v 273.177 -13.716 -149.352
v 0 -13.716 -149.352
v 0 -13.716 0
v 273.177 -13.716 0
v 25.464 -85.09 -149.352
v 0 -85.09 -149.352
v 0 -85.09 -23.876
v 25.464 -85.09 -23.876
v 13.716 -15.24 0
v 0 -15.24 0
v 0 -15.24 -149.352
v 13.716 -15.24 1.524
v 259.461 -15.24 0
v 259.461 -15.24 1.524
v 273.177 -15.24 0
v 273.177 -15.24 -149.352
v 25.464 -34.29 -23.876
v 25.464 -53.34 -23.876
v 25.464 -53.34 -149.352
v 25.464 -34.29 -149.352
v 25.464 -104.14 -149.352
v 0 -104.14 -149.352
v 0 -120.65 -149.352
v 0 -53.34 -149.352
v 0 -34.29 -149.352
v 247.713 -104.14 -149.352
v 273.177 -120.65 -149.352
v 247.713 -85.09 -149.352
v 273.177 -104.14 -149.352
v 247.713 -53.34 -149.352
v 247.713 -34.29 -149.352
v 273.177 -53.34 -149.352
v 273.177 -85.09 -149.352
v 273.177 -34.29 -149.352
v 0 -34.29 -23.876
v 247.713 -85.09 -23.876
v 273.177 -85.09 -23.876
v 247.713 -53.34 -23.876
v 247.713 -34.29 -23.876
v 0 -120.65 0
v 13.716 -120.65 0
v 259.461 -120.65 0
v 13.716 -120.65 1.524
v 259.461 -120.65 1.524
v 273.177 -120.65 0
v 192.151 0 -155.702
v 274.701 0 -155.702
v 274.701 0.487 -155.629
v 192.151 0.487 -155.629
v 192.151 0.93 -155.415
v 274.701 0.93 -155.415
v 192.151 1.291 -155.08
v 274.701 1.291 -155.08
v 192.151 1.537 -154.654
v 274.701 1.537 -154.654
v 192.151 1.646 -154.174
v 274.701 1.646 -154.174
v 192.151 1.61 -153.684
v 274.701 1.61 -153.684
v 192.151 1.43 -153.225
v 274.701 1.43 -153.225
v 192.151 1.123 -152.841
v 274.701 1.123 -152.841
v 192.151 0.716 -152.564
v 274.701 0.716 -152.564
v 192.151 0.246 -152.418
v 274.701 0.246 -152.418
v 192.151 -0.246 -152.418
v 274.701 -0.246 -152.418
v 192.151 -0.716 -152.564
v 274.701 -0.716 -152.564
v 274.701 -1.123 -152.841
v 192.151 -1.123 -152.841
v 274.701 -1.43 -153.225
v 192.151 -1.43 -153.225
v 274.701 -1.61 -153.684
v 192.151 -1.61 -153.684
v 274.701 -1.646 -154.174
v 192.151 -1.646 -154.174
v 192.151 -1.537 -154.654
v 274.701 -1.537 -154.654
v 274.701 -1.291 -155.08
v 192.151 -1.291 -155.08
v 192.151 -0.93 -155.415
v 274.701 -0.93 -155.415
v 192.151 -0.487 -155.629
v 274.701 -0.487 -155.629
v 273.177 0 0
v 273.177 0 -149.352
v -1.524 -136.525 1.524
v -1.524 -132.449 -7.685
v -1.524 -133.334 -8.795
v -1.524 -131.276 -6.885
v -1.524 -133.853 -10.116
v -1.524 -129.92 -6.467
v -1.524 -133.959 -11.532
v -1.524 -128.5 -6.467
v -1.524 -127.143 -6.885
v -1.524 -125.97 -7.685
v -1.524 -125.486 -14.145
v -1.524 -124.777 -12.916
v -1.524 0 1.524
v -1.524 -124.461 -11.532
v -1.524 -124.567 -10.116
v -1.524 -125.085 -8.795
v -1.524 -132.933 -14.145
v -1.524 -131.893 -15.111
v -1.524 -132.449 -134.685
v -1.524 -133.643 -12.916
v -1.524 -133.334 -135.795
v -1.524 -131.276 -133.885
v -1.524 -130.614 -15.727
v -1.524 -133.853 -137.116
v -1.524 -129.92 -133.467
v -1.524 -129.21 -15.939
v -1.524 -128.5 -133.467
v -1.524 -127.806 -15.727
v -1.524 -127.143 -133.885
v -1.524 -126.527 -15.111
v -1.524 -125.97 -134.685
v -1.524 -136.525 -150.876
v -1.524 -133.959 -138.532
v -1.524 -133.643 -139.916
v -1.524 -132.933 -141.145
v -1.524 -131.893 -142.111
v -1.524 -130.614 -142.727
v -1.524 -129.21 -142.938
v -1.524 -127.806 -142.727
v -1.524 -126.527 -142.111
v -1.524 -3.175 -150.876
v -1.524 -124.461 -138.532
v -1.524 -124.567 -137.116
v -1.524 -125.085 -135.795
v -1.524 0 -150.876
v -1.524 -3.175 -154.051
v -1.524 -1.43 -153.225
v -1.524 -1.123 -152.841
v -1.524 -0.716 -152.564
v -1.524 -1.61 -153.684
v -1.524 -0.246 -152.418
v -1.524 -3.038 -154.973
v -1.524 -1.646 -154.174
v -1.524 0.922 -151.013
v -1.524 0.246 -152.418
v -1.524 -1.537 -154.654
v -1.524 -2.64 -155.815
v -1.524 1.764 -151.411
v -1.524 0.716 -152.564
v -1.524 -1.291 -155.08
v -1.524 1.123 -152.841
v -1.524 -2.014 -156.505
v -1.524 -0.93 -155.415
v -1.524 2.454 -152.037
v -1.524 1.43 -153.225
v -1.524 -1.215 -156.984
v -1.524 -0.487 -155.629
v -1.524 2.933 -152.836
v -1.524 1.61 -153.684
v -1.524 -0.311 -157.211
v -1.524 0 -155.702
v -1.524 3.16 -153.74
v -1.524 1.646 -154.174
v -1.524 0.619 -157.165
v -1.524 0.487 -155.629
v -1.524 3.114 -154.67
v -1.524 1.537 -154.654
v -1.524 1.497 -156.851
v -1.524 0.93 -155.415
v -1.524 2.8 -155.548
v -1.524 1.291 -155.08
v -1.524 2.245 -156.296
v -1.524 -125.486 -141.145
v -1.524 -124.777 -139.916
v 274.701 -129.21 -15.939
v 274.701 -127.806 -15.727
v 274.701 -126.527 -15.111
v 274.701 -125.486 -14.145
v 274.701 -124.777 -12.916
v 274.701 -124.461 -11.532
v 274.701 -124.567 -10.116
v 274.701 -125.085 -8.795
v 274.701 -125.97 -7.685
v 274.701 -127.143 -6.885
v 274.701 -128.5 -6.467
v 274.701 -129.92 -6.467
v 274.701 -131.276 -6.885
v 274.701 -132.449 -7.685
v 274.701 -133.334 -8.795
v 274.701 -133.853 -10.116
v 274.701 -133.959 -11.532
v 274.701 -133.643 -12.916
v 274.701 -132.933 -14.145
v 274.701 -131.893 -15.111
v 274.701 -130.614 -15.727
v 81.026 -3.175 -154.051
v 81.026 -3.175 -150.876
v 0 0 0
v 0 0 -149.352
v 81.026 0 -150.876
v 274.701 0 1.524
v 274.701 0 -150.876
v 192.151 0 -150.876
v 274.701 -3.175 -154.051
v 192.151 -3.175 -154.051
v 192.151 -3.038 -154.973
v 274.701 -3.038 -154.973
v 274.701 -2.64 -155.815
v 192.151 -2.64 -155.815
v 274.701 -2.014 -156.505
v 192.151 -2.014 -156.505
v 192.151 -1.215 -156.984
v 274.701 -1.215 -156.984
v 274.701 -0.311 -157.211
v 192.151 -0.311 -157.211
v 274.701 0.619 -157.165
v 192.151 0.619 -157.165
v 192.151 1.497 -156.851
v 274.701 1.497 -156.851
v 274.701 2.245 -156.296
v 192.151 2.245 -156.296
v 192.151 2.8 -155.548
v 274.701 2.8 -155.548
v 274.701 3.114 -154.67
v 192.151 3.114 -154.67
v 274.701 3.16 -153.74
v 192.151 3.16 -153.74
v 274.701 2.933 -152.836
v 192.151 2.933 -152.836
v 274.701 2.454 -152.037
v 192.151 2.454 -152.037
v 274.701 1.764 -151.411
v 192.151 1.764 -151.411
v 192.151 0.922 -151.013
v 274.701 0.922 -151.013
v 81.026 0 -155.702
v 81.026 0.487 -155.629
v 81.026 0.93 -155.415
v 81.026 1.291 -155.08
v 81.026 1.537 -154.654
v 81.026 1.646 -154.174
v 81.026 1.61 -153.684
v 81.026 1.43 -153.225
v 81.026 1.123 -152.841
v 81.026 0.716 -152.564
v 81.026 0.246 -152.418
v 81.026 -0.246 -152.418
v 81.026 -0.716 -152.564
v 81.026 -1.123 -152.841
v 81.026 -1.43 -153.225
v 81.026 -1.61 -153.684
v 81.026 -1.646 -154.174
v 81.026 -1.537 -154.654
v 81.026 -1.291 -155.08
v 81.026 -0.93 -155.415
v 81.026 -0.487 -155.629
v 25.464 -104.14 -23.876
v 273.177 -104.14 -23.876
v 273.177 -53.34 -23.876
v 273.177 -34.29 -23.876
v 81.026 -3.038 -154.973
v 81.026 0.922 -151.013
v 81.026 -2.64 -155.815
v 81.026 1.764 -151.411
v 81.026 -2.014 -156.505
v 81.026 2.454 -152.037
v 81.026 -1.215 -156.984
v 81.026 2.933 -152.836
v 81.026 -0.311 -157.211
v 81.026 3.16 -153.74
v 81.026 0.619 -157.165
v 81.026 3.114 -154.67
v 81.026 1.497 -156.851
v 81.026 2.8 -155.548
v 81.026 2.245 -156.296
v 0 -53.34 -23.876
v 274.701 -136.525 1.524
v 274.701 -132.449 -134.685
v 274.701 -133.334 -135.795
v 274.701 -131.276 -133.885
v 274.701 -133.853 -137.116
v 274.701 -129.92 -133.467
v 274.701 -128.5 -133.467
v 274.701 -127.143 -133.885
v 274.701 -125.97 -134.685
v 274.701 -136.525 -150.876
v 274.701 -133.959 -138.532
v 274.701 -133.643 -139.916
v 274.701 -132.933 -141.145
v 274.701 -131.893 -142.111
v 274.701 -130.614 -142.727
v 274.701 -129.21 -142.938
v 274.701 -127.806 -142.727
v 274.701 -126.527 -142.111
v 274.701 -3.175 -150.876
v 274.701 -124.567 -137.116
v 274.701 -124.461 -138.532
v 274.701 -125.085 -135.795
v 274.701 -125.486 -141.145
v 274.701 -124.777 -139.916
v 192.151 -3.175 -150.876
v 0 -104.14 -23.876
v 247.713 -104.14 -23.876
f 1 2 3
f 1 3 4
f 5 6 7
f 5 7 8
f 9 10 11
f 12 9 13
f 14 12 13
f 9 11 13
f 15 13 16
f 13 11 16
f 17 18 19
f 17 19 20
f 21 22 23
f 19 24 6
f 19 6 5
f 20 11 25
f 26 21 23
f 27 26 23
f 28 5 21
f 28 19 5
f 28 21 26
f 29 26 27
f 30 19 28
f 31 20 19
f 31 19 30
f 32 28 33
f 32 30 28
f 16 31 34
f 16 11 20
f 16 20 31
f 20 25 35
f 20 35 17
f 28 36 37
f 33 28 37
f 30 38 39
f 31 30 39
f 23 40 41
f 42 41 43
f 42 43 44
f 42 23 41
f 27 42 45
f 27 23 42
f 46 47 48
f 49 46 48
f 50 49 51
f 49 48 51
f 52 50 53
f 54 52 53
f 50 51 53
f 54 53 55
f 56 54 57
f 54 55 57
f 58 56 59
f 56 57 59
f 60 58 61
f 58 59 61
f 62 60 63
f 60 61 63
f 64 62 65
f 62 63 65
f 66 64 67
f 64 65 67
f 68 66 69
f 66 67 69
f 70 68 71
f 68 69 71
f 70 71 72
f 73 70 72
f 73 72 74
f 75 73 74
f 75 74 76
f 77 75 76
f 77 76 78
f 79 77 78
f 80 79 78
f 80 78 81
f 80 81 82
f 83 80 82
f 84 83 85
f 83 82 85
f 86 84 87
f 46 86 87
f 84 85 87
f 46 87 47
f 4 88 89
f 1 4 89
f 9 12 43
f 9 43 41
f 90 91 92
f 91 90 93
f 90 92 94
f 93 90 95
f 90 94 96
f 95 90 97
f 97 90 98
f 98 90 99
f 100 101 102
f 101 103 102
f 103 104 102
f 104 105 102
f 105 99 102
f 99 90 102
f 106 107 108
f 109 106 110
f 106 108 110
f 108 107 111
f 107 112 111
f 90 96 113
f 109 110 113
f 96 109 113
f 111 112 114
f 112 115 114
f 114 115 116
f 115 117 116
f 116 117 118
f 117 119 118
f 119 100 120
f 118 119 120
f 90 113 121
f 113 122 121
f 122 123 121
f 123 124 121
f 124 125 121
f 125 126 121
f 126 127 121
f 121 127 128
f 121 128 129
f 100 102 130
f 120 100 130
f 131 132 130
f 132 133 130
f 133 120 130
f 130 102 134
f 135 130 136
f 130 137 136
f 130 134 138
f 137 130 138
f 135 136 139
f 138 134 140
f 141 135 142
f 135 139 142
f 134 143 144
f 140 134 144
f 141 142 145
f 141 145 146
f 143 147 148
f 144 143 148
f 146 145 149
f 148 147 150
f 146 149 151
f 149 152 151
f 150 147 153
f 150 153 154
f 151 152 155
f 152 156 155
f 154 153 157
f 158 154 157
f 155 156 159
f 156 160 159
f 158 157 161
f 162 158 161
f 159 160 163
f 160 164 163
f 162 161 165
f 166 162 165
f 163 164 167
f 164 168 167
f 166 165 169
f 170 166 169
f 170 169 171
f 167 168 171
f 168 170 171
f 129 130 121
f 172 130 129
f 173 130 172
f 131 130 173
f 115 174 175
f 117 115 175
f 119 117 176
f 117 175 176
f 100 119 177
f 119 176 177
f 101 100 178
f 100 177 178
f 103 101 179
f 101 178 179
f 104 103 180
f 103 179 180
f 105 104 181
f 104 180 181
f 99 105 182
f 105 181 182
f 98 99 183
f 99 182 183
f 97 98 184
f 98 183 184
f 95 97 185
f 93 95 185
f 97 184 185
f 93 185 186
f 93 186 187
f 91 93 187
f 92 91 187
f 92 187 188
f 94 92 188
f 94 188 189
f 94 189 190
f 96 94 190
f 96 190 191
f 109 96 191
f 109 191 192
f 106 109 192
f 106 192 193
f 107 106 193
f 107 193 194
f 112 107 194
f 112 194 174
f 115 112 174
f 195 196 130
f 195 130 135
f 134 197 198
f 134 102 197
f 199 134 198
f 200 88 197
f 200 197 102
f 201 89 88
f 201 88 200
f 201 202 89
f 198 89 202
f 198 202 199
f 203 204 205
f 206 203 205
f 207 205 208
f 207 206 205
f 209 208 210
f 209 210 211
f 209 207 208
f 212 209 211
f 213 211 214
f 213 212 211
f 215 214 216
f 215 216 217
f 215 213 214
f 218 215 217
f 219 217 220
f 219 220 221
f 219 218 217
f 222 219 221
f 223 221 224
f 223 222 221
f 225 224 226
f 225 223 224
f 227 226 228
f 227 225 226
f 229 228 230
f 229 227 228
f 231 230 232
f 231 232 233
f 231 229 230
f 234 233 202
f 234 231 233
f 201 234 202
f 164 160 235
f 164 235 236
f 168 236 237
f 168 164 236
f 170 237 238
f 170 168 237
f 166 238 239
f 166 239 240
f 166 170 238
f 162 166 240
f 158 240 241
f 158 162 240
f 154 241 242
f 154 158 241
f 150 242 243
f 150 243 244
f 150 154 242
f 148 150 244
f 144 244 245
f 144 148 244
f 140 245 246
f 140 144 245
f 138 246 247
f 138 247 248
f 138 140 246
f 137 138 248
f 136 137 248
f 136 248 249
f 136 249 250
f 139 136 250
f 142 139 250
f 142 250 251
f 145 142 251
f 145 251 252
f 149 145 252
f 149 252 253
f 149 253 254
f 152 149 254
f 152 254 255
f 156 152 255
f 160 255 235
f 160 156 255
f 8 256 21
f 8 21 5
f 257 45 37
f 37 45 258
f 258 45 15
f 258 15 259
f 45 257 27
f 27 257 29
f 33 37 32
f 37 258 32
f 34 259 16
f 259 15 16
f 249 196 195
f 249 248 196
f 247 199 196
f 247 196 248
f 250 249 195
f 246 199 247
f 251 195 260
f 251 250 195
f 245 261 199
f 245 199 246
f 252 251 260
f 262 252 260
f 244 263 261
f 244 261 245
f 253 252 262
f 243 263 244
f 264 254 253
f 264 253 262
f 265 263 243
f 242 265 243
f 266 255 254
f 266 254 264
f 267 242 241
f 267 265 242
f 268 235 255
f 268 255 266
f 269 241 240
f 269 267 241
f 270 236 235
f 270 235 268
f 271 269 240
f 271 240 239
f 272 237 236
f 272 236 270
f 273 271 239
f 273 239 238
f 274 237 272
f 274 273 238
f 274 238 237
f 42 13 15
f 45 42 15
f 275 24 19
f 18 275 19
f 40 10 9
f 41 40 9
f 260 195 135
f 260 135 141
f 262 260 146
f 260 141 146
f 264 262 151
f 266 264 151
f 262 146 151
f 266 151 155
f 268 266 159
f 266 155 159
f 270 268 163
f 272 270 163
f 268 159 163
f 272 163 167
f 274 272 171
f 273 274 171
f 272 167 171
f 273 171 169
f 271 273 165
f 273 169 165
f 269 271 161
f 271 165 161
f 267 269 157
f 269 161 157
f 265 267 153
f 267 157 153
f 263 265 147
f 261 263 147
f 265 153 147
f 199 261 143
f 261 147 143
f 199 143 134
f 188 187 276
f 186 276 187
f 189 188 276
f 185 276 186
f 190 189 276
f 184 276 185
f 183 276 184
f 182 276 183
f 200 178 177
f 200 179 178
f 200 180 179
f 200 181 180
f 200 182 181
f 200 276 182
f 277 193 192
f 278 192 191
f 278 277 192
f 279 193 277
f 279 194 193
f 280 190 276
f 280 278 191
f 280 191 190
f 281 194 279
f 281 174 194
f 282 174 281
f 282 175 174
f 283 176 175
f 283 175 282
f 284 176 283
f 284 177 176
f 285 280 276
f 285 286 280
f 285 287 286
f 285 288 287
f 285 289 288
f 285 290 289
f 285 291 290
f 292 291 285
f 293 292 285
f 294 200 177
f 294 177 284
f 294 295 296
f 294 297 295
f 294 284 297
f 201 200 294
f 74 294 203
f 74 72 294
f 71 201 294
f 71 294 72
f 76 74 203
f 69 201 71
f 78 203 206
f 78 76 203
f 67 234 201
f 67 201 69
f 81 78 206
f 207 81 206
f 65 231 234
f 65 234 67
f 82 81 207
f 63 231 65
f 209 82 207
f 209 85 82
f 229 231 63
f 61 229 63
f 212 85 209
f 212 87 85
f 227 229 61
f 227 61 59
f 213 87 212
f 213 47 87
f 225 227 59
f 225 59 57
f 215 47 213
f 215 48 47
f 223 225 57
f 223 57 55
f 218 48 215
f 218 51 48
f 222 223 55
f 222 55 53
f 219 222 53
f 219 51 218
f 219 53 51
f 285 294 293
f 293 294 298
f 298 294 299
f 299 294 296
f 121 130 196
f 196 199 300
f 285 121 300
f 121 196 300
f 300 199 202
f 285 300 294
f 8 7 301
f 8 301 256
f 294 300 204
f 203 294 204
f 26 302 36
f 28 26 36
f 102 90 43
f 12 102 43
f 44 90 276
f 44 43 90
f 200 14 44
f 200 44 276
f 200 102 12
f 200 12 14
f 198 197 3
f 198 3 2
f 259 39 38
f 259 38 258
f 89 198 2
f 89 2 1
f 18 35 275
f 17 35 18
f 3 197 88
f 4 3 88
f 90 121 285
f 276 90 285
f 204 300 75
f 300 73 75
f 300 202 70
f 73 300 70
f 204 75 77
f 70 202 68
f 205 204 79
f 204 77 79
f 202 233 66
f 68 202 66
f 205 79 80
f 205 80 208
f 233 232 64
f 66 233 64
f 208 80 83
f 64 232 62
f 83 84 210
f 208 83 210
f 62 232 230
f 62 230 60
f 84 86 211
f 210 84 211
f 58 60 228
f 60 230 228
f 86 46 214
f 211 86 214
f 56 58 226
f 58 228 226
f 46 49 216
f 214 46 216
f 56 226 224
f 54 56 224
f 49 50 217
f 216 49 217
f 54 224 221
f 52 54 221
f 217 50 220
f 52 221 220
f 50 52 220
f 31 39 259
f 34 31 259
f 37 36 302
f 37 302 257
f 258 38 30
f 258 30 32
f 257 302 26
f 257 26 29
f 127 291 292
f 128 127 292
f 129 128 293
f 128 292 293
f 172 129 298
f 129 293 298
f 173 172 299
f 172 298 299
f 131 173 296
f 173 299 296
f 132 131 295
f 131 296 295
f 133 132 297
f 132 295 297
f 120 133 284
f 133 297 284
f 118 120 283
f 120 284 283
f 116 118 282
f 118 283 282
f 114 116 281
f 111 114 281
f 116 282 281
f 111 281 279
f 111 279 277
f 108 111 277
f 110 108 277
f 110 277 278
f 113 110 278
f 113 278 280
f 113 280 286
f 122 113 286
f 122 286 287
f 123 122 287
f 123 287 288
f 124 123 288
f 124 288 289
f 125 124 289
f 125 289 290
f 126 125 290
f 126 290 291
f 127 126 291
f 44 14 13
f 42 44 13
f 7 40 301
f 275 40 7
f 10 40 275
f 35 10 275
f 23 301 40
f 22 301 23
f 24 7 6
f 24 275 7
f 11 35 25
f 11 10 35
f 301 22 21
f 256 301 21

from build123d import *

# Parameters (mm, degrees)
SKETCH1_W               = 276.225
SKETCH1_H               = 152.4
BULK_EXTRUDE_DEPTH      = 136.525
SKETCH1_13_W            = 273.177
SKETCH1_13_H            = 149.352
SKETCH1_13_W_2          = 245.745
SKETCH1_13_H_2          = 1.524
INNER_SHELL_CUT_DEPTH   = 120.65
SKETCH1_14_W            = 245.745
SKETCH1_14_H            = 1.524
TOP_WALL_EXTRUDE_DEPTH  = 15.24
TOP_START               = -15.24
SKETCH1_15_W            = 273.177
SKETCH1_15_H            = 149.352
TOP_FLOOR_EXTRUDE_DEPTH = 1.524
SKETCH5_R               = 1.651
HINGE_EXTRUDE_DEPTH     = 82.55
SKETCH7_W               = 25.4635
SKETCH7_H               = 19.05
RAILS_EXTRUDE_DEPTH     = 125.476
SKETCH8_R               = 4.7625
CUT_EXTRUDE1_DEPTH      = 346.918113614
CUT_EXTRUDE1_DEPTH_BACK = 346.918113614


with BuildPart() as part:
    # Sketch1 → Bulk-Extrude (new body)
    with BuildSketch(Plane(origin=(0, 0, 0), x_dir=(1, 0, 0), z_dir=(0, 1, 0))):
        with Locations((136.5885, 74.676)):
            Rectangle(SKETCH1_W, SKETCH1_H)
    extrude(amount=-BULK_EXTRUDE_DEPTH)

    # Sketch1<13> → Inner Shell-Cut (cut)
    with BuildSketch(Plane(origin=(0, 0, 0), x_dir=(1, 0, 0), z_dir=(0, 1, 0))):
        with Locations((136.5885, 74.676)):
            Rectangle(SKETCH1_13_W, SKETCH1_13_H)
        with Locations((136.5885, -0.762)):
            Rectangle(SKETCH1_13_W_2, SKETCH1_13_H_2)
    extrude(amount=-INNER_SHELL_CUT_DEPTH, mode=Mode.SUBTRACT)

    # Sketch1<14> → Top Wall-Extrude (add)
    with BuildSketch(Plane(origin=(0, 0, 0), x_dir=(1, 0, 0), z_dir=(0, 1, 0))):
        with Locations((136.5885, -0.762)):
            Rectangle(SKETCH1_14_W, SKETCH1_14_H)
    extrude(amount=-TOP_WALL_EXTRUDE_DEPTH)

    # Sketch1<15> → Top Floor-Extrude (add)
    with BuildSketch(Plane(origin=(0, 0, 0), x_dir=(1, 0, 0), z_dir=(0, 1, 0)).offset(TOP_START)):
        with Locations((136.5885, 74.676)):
            Rectangle(SKETCH1_15_W, SKETCH1_15_H)
    extrude(amount=TOP_FLOOR_EXTRUDE_DEPTH)

    # Sketch5 → Hinge-Extrude (add)
    with BuildSketch(Plane(origin=(274.701, 0, 0), x_dir=(0, 0, -1), z_dir=(1, 0, 0))):
        with BuildLine():
            Line((150.876, 0), (150.876, -3.175))
            Line((150.876, -3.175), (154.051, -3.175))
            ThreePointArc((154.051, -3.175), (156.29606403, 2.24506403), (150.876, 0))
        make_face()
        with Locations((154.051, 0)):
            Circle(SKETCH5_R, mode=Mode.SUBTRACT)
    hinge_extrude = extrude(amount=-HINGE_EXTRUDE_DEPTH)

    # Mirror1: Hinge-Extrude across plane
    add(hinge_extrude.mirror(Plane(origin=(136.5885, 0, 0), x_dir=(0, 0, 1), z_dir=(1, 0, 0))))

    # Sketch7 → Rails-Extrude (add)
    with BuildSketch(Plane.XY.offset(-149.352)):
        with Locations((12.73175, -43.815)):
            Rectangle(SKETCH7_W, SKETCH7_H)
        with Locations((260.44525, -43.815)):
            Rectangle(SKETCH7_W, SKETCH7_H)
        with Locations((12.73175, -94.615)):
            Rectangle(SKETCH7_W, SKETCH7_H)
        with Locations((260.44525, -94.615)):
            Rectangle(SKETCH7_W, SKETCH7_H)
    extrude(amount=RAILS_EXTRUDE_DEPTH)

    # Sketch8 → Cut-Extrude1 (cut, two sides)
    with BuildSketch(Plane(origin=(274.701, 0, 0), x_dir=(0, 0, -1), z_dir=(1, 0, 0))) as cut_extrude1_sk:
        with Locations((11.176, -129.2098)):
            Circle(SKETCH8_R)
        with Locations((138.176, -129.2098)):
            Circle(SKETCH8_R)
    extrude(amount=CUT_EXTRUDE1_DEPTH, mode=Mode.SUBTRACT)
    extrude(cut_extrude1_sk.sketch, amount=-CUT_EXTRUDE1_DEPTH_BACK, mode=Mode.SUBTRACT)


solid = part.part
